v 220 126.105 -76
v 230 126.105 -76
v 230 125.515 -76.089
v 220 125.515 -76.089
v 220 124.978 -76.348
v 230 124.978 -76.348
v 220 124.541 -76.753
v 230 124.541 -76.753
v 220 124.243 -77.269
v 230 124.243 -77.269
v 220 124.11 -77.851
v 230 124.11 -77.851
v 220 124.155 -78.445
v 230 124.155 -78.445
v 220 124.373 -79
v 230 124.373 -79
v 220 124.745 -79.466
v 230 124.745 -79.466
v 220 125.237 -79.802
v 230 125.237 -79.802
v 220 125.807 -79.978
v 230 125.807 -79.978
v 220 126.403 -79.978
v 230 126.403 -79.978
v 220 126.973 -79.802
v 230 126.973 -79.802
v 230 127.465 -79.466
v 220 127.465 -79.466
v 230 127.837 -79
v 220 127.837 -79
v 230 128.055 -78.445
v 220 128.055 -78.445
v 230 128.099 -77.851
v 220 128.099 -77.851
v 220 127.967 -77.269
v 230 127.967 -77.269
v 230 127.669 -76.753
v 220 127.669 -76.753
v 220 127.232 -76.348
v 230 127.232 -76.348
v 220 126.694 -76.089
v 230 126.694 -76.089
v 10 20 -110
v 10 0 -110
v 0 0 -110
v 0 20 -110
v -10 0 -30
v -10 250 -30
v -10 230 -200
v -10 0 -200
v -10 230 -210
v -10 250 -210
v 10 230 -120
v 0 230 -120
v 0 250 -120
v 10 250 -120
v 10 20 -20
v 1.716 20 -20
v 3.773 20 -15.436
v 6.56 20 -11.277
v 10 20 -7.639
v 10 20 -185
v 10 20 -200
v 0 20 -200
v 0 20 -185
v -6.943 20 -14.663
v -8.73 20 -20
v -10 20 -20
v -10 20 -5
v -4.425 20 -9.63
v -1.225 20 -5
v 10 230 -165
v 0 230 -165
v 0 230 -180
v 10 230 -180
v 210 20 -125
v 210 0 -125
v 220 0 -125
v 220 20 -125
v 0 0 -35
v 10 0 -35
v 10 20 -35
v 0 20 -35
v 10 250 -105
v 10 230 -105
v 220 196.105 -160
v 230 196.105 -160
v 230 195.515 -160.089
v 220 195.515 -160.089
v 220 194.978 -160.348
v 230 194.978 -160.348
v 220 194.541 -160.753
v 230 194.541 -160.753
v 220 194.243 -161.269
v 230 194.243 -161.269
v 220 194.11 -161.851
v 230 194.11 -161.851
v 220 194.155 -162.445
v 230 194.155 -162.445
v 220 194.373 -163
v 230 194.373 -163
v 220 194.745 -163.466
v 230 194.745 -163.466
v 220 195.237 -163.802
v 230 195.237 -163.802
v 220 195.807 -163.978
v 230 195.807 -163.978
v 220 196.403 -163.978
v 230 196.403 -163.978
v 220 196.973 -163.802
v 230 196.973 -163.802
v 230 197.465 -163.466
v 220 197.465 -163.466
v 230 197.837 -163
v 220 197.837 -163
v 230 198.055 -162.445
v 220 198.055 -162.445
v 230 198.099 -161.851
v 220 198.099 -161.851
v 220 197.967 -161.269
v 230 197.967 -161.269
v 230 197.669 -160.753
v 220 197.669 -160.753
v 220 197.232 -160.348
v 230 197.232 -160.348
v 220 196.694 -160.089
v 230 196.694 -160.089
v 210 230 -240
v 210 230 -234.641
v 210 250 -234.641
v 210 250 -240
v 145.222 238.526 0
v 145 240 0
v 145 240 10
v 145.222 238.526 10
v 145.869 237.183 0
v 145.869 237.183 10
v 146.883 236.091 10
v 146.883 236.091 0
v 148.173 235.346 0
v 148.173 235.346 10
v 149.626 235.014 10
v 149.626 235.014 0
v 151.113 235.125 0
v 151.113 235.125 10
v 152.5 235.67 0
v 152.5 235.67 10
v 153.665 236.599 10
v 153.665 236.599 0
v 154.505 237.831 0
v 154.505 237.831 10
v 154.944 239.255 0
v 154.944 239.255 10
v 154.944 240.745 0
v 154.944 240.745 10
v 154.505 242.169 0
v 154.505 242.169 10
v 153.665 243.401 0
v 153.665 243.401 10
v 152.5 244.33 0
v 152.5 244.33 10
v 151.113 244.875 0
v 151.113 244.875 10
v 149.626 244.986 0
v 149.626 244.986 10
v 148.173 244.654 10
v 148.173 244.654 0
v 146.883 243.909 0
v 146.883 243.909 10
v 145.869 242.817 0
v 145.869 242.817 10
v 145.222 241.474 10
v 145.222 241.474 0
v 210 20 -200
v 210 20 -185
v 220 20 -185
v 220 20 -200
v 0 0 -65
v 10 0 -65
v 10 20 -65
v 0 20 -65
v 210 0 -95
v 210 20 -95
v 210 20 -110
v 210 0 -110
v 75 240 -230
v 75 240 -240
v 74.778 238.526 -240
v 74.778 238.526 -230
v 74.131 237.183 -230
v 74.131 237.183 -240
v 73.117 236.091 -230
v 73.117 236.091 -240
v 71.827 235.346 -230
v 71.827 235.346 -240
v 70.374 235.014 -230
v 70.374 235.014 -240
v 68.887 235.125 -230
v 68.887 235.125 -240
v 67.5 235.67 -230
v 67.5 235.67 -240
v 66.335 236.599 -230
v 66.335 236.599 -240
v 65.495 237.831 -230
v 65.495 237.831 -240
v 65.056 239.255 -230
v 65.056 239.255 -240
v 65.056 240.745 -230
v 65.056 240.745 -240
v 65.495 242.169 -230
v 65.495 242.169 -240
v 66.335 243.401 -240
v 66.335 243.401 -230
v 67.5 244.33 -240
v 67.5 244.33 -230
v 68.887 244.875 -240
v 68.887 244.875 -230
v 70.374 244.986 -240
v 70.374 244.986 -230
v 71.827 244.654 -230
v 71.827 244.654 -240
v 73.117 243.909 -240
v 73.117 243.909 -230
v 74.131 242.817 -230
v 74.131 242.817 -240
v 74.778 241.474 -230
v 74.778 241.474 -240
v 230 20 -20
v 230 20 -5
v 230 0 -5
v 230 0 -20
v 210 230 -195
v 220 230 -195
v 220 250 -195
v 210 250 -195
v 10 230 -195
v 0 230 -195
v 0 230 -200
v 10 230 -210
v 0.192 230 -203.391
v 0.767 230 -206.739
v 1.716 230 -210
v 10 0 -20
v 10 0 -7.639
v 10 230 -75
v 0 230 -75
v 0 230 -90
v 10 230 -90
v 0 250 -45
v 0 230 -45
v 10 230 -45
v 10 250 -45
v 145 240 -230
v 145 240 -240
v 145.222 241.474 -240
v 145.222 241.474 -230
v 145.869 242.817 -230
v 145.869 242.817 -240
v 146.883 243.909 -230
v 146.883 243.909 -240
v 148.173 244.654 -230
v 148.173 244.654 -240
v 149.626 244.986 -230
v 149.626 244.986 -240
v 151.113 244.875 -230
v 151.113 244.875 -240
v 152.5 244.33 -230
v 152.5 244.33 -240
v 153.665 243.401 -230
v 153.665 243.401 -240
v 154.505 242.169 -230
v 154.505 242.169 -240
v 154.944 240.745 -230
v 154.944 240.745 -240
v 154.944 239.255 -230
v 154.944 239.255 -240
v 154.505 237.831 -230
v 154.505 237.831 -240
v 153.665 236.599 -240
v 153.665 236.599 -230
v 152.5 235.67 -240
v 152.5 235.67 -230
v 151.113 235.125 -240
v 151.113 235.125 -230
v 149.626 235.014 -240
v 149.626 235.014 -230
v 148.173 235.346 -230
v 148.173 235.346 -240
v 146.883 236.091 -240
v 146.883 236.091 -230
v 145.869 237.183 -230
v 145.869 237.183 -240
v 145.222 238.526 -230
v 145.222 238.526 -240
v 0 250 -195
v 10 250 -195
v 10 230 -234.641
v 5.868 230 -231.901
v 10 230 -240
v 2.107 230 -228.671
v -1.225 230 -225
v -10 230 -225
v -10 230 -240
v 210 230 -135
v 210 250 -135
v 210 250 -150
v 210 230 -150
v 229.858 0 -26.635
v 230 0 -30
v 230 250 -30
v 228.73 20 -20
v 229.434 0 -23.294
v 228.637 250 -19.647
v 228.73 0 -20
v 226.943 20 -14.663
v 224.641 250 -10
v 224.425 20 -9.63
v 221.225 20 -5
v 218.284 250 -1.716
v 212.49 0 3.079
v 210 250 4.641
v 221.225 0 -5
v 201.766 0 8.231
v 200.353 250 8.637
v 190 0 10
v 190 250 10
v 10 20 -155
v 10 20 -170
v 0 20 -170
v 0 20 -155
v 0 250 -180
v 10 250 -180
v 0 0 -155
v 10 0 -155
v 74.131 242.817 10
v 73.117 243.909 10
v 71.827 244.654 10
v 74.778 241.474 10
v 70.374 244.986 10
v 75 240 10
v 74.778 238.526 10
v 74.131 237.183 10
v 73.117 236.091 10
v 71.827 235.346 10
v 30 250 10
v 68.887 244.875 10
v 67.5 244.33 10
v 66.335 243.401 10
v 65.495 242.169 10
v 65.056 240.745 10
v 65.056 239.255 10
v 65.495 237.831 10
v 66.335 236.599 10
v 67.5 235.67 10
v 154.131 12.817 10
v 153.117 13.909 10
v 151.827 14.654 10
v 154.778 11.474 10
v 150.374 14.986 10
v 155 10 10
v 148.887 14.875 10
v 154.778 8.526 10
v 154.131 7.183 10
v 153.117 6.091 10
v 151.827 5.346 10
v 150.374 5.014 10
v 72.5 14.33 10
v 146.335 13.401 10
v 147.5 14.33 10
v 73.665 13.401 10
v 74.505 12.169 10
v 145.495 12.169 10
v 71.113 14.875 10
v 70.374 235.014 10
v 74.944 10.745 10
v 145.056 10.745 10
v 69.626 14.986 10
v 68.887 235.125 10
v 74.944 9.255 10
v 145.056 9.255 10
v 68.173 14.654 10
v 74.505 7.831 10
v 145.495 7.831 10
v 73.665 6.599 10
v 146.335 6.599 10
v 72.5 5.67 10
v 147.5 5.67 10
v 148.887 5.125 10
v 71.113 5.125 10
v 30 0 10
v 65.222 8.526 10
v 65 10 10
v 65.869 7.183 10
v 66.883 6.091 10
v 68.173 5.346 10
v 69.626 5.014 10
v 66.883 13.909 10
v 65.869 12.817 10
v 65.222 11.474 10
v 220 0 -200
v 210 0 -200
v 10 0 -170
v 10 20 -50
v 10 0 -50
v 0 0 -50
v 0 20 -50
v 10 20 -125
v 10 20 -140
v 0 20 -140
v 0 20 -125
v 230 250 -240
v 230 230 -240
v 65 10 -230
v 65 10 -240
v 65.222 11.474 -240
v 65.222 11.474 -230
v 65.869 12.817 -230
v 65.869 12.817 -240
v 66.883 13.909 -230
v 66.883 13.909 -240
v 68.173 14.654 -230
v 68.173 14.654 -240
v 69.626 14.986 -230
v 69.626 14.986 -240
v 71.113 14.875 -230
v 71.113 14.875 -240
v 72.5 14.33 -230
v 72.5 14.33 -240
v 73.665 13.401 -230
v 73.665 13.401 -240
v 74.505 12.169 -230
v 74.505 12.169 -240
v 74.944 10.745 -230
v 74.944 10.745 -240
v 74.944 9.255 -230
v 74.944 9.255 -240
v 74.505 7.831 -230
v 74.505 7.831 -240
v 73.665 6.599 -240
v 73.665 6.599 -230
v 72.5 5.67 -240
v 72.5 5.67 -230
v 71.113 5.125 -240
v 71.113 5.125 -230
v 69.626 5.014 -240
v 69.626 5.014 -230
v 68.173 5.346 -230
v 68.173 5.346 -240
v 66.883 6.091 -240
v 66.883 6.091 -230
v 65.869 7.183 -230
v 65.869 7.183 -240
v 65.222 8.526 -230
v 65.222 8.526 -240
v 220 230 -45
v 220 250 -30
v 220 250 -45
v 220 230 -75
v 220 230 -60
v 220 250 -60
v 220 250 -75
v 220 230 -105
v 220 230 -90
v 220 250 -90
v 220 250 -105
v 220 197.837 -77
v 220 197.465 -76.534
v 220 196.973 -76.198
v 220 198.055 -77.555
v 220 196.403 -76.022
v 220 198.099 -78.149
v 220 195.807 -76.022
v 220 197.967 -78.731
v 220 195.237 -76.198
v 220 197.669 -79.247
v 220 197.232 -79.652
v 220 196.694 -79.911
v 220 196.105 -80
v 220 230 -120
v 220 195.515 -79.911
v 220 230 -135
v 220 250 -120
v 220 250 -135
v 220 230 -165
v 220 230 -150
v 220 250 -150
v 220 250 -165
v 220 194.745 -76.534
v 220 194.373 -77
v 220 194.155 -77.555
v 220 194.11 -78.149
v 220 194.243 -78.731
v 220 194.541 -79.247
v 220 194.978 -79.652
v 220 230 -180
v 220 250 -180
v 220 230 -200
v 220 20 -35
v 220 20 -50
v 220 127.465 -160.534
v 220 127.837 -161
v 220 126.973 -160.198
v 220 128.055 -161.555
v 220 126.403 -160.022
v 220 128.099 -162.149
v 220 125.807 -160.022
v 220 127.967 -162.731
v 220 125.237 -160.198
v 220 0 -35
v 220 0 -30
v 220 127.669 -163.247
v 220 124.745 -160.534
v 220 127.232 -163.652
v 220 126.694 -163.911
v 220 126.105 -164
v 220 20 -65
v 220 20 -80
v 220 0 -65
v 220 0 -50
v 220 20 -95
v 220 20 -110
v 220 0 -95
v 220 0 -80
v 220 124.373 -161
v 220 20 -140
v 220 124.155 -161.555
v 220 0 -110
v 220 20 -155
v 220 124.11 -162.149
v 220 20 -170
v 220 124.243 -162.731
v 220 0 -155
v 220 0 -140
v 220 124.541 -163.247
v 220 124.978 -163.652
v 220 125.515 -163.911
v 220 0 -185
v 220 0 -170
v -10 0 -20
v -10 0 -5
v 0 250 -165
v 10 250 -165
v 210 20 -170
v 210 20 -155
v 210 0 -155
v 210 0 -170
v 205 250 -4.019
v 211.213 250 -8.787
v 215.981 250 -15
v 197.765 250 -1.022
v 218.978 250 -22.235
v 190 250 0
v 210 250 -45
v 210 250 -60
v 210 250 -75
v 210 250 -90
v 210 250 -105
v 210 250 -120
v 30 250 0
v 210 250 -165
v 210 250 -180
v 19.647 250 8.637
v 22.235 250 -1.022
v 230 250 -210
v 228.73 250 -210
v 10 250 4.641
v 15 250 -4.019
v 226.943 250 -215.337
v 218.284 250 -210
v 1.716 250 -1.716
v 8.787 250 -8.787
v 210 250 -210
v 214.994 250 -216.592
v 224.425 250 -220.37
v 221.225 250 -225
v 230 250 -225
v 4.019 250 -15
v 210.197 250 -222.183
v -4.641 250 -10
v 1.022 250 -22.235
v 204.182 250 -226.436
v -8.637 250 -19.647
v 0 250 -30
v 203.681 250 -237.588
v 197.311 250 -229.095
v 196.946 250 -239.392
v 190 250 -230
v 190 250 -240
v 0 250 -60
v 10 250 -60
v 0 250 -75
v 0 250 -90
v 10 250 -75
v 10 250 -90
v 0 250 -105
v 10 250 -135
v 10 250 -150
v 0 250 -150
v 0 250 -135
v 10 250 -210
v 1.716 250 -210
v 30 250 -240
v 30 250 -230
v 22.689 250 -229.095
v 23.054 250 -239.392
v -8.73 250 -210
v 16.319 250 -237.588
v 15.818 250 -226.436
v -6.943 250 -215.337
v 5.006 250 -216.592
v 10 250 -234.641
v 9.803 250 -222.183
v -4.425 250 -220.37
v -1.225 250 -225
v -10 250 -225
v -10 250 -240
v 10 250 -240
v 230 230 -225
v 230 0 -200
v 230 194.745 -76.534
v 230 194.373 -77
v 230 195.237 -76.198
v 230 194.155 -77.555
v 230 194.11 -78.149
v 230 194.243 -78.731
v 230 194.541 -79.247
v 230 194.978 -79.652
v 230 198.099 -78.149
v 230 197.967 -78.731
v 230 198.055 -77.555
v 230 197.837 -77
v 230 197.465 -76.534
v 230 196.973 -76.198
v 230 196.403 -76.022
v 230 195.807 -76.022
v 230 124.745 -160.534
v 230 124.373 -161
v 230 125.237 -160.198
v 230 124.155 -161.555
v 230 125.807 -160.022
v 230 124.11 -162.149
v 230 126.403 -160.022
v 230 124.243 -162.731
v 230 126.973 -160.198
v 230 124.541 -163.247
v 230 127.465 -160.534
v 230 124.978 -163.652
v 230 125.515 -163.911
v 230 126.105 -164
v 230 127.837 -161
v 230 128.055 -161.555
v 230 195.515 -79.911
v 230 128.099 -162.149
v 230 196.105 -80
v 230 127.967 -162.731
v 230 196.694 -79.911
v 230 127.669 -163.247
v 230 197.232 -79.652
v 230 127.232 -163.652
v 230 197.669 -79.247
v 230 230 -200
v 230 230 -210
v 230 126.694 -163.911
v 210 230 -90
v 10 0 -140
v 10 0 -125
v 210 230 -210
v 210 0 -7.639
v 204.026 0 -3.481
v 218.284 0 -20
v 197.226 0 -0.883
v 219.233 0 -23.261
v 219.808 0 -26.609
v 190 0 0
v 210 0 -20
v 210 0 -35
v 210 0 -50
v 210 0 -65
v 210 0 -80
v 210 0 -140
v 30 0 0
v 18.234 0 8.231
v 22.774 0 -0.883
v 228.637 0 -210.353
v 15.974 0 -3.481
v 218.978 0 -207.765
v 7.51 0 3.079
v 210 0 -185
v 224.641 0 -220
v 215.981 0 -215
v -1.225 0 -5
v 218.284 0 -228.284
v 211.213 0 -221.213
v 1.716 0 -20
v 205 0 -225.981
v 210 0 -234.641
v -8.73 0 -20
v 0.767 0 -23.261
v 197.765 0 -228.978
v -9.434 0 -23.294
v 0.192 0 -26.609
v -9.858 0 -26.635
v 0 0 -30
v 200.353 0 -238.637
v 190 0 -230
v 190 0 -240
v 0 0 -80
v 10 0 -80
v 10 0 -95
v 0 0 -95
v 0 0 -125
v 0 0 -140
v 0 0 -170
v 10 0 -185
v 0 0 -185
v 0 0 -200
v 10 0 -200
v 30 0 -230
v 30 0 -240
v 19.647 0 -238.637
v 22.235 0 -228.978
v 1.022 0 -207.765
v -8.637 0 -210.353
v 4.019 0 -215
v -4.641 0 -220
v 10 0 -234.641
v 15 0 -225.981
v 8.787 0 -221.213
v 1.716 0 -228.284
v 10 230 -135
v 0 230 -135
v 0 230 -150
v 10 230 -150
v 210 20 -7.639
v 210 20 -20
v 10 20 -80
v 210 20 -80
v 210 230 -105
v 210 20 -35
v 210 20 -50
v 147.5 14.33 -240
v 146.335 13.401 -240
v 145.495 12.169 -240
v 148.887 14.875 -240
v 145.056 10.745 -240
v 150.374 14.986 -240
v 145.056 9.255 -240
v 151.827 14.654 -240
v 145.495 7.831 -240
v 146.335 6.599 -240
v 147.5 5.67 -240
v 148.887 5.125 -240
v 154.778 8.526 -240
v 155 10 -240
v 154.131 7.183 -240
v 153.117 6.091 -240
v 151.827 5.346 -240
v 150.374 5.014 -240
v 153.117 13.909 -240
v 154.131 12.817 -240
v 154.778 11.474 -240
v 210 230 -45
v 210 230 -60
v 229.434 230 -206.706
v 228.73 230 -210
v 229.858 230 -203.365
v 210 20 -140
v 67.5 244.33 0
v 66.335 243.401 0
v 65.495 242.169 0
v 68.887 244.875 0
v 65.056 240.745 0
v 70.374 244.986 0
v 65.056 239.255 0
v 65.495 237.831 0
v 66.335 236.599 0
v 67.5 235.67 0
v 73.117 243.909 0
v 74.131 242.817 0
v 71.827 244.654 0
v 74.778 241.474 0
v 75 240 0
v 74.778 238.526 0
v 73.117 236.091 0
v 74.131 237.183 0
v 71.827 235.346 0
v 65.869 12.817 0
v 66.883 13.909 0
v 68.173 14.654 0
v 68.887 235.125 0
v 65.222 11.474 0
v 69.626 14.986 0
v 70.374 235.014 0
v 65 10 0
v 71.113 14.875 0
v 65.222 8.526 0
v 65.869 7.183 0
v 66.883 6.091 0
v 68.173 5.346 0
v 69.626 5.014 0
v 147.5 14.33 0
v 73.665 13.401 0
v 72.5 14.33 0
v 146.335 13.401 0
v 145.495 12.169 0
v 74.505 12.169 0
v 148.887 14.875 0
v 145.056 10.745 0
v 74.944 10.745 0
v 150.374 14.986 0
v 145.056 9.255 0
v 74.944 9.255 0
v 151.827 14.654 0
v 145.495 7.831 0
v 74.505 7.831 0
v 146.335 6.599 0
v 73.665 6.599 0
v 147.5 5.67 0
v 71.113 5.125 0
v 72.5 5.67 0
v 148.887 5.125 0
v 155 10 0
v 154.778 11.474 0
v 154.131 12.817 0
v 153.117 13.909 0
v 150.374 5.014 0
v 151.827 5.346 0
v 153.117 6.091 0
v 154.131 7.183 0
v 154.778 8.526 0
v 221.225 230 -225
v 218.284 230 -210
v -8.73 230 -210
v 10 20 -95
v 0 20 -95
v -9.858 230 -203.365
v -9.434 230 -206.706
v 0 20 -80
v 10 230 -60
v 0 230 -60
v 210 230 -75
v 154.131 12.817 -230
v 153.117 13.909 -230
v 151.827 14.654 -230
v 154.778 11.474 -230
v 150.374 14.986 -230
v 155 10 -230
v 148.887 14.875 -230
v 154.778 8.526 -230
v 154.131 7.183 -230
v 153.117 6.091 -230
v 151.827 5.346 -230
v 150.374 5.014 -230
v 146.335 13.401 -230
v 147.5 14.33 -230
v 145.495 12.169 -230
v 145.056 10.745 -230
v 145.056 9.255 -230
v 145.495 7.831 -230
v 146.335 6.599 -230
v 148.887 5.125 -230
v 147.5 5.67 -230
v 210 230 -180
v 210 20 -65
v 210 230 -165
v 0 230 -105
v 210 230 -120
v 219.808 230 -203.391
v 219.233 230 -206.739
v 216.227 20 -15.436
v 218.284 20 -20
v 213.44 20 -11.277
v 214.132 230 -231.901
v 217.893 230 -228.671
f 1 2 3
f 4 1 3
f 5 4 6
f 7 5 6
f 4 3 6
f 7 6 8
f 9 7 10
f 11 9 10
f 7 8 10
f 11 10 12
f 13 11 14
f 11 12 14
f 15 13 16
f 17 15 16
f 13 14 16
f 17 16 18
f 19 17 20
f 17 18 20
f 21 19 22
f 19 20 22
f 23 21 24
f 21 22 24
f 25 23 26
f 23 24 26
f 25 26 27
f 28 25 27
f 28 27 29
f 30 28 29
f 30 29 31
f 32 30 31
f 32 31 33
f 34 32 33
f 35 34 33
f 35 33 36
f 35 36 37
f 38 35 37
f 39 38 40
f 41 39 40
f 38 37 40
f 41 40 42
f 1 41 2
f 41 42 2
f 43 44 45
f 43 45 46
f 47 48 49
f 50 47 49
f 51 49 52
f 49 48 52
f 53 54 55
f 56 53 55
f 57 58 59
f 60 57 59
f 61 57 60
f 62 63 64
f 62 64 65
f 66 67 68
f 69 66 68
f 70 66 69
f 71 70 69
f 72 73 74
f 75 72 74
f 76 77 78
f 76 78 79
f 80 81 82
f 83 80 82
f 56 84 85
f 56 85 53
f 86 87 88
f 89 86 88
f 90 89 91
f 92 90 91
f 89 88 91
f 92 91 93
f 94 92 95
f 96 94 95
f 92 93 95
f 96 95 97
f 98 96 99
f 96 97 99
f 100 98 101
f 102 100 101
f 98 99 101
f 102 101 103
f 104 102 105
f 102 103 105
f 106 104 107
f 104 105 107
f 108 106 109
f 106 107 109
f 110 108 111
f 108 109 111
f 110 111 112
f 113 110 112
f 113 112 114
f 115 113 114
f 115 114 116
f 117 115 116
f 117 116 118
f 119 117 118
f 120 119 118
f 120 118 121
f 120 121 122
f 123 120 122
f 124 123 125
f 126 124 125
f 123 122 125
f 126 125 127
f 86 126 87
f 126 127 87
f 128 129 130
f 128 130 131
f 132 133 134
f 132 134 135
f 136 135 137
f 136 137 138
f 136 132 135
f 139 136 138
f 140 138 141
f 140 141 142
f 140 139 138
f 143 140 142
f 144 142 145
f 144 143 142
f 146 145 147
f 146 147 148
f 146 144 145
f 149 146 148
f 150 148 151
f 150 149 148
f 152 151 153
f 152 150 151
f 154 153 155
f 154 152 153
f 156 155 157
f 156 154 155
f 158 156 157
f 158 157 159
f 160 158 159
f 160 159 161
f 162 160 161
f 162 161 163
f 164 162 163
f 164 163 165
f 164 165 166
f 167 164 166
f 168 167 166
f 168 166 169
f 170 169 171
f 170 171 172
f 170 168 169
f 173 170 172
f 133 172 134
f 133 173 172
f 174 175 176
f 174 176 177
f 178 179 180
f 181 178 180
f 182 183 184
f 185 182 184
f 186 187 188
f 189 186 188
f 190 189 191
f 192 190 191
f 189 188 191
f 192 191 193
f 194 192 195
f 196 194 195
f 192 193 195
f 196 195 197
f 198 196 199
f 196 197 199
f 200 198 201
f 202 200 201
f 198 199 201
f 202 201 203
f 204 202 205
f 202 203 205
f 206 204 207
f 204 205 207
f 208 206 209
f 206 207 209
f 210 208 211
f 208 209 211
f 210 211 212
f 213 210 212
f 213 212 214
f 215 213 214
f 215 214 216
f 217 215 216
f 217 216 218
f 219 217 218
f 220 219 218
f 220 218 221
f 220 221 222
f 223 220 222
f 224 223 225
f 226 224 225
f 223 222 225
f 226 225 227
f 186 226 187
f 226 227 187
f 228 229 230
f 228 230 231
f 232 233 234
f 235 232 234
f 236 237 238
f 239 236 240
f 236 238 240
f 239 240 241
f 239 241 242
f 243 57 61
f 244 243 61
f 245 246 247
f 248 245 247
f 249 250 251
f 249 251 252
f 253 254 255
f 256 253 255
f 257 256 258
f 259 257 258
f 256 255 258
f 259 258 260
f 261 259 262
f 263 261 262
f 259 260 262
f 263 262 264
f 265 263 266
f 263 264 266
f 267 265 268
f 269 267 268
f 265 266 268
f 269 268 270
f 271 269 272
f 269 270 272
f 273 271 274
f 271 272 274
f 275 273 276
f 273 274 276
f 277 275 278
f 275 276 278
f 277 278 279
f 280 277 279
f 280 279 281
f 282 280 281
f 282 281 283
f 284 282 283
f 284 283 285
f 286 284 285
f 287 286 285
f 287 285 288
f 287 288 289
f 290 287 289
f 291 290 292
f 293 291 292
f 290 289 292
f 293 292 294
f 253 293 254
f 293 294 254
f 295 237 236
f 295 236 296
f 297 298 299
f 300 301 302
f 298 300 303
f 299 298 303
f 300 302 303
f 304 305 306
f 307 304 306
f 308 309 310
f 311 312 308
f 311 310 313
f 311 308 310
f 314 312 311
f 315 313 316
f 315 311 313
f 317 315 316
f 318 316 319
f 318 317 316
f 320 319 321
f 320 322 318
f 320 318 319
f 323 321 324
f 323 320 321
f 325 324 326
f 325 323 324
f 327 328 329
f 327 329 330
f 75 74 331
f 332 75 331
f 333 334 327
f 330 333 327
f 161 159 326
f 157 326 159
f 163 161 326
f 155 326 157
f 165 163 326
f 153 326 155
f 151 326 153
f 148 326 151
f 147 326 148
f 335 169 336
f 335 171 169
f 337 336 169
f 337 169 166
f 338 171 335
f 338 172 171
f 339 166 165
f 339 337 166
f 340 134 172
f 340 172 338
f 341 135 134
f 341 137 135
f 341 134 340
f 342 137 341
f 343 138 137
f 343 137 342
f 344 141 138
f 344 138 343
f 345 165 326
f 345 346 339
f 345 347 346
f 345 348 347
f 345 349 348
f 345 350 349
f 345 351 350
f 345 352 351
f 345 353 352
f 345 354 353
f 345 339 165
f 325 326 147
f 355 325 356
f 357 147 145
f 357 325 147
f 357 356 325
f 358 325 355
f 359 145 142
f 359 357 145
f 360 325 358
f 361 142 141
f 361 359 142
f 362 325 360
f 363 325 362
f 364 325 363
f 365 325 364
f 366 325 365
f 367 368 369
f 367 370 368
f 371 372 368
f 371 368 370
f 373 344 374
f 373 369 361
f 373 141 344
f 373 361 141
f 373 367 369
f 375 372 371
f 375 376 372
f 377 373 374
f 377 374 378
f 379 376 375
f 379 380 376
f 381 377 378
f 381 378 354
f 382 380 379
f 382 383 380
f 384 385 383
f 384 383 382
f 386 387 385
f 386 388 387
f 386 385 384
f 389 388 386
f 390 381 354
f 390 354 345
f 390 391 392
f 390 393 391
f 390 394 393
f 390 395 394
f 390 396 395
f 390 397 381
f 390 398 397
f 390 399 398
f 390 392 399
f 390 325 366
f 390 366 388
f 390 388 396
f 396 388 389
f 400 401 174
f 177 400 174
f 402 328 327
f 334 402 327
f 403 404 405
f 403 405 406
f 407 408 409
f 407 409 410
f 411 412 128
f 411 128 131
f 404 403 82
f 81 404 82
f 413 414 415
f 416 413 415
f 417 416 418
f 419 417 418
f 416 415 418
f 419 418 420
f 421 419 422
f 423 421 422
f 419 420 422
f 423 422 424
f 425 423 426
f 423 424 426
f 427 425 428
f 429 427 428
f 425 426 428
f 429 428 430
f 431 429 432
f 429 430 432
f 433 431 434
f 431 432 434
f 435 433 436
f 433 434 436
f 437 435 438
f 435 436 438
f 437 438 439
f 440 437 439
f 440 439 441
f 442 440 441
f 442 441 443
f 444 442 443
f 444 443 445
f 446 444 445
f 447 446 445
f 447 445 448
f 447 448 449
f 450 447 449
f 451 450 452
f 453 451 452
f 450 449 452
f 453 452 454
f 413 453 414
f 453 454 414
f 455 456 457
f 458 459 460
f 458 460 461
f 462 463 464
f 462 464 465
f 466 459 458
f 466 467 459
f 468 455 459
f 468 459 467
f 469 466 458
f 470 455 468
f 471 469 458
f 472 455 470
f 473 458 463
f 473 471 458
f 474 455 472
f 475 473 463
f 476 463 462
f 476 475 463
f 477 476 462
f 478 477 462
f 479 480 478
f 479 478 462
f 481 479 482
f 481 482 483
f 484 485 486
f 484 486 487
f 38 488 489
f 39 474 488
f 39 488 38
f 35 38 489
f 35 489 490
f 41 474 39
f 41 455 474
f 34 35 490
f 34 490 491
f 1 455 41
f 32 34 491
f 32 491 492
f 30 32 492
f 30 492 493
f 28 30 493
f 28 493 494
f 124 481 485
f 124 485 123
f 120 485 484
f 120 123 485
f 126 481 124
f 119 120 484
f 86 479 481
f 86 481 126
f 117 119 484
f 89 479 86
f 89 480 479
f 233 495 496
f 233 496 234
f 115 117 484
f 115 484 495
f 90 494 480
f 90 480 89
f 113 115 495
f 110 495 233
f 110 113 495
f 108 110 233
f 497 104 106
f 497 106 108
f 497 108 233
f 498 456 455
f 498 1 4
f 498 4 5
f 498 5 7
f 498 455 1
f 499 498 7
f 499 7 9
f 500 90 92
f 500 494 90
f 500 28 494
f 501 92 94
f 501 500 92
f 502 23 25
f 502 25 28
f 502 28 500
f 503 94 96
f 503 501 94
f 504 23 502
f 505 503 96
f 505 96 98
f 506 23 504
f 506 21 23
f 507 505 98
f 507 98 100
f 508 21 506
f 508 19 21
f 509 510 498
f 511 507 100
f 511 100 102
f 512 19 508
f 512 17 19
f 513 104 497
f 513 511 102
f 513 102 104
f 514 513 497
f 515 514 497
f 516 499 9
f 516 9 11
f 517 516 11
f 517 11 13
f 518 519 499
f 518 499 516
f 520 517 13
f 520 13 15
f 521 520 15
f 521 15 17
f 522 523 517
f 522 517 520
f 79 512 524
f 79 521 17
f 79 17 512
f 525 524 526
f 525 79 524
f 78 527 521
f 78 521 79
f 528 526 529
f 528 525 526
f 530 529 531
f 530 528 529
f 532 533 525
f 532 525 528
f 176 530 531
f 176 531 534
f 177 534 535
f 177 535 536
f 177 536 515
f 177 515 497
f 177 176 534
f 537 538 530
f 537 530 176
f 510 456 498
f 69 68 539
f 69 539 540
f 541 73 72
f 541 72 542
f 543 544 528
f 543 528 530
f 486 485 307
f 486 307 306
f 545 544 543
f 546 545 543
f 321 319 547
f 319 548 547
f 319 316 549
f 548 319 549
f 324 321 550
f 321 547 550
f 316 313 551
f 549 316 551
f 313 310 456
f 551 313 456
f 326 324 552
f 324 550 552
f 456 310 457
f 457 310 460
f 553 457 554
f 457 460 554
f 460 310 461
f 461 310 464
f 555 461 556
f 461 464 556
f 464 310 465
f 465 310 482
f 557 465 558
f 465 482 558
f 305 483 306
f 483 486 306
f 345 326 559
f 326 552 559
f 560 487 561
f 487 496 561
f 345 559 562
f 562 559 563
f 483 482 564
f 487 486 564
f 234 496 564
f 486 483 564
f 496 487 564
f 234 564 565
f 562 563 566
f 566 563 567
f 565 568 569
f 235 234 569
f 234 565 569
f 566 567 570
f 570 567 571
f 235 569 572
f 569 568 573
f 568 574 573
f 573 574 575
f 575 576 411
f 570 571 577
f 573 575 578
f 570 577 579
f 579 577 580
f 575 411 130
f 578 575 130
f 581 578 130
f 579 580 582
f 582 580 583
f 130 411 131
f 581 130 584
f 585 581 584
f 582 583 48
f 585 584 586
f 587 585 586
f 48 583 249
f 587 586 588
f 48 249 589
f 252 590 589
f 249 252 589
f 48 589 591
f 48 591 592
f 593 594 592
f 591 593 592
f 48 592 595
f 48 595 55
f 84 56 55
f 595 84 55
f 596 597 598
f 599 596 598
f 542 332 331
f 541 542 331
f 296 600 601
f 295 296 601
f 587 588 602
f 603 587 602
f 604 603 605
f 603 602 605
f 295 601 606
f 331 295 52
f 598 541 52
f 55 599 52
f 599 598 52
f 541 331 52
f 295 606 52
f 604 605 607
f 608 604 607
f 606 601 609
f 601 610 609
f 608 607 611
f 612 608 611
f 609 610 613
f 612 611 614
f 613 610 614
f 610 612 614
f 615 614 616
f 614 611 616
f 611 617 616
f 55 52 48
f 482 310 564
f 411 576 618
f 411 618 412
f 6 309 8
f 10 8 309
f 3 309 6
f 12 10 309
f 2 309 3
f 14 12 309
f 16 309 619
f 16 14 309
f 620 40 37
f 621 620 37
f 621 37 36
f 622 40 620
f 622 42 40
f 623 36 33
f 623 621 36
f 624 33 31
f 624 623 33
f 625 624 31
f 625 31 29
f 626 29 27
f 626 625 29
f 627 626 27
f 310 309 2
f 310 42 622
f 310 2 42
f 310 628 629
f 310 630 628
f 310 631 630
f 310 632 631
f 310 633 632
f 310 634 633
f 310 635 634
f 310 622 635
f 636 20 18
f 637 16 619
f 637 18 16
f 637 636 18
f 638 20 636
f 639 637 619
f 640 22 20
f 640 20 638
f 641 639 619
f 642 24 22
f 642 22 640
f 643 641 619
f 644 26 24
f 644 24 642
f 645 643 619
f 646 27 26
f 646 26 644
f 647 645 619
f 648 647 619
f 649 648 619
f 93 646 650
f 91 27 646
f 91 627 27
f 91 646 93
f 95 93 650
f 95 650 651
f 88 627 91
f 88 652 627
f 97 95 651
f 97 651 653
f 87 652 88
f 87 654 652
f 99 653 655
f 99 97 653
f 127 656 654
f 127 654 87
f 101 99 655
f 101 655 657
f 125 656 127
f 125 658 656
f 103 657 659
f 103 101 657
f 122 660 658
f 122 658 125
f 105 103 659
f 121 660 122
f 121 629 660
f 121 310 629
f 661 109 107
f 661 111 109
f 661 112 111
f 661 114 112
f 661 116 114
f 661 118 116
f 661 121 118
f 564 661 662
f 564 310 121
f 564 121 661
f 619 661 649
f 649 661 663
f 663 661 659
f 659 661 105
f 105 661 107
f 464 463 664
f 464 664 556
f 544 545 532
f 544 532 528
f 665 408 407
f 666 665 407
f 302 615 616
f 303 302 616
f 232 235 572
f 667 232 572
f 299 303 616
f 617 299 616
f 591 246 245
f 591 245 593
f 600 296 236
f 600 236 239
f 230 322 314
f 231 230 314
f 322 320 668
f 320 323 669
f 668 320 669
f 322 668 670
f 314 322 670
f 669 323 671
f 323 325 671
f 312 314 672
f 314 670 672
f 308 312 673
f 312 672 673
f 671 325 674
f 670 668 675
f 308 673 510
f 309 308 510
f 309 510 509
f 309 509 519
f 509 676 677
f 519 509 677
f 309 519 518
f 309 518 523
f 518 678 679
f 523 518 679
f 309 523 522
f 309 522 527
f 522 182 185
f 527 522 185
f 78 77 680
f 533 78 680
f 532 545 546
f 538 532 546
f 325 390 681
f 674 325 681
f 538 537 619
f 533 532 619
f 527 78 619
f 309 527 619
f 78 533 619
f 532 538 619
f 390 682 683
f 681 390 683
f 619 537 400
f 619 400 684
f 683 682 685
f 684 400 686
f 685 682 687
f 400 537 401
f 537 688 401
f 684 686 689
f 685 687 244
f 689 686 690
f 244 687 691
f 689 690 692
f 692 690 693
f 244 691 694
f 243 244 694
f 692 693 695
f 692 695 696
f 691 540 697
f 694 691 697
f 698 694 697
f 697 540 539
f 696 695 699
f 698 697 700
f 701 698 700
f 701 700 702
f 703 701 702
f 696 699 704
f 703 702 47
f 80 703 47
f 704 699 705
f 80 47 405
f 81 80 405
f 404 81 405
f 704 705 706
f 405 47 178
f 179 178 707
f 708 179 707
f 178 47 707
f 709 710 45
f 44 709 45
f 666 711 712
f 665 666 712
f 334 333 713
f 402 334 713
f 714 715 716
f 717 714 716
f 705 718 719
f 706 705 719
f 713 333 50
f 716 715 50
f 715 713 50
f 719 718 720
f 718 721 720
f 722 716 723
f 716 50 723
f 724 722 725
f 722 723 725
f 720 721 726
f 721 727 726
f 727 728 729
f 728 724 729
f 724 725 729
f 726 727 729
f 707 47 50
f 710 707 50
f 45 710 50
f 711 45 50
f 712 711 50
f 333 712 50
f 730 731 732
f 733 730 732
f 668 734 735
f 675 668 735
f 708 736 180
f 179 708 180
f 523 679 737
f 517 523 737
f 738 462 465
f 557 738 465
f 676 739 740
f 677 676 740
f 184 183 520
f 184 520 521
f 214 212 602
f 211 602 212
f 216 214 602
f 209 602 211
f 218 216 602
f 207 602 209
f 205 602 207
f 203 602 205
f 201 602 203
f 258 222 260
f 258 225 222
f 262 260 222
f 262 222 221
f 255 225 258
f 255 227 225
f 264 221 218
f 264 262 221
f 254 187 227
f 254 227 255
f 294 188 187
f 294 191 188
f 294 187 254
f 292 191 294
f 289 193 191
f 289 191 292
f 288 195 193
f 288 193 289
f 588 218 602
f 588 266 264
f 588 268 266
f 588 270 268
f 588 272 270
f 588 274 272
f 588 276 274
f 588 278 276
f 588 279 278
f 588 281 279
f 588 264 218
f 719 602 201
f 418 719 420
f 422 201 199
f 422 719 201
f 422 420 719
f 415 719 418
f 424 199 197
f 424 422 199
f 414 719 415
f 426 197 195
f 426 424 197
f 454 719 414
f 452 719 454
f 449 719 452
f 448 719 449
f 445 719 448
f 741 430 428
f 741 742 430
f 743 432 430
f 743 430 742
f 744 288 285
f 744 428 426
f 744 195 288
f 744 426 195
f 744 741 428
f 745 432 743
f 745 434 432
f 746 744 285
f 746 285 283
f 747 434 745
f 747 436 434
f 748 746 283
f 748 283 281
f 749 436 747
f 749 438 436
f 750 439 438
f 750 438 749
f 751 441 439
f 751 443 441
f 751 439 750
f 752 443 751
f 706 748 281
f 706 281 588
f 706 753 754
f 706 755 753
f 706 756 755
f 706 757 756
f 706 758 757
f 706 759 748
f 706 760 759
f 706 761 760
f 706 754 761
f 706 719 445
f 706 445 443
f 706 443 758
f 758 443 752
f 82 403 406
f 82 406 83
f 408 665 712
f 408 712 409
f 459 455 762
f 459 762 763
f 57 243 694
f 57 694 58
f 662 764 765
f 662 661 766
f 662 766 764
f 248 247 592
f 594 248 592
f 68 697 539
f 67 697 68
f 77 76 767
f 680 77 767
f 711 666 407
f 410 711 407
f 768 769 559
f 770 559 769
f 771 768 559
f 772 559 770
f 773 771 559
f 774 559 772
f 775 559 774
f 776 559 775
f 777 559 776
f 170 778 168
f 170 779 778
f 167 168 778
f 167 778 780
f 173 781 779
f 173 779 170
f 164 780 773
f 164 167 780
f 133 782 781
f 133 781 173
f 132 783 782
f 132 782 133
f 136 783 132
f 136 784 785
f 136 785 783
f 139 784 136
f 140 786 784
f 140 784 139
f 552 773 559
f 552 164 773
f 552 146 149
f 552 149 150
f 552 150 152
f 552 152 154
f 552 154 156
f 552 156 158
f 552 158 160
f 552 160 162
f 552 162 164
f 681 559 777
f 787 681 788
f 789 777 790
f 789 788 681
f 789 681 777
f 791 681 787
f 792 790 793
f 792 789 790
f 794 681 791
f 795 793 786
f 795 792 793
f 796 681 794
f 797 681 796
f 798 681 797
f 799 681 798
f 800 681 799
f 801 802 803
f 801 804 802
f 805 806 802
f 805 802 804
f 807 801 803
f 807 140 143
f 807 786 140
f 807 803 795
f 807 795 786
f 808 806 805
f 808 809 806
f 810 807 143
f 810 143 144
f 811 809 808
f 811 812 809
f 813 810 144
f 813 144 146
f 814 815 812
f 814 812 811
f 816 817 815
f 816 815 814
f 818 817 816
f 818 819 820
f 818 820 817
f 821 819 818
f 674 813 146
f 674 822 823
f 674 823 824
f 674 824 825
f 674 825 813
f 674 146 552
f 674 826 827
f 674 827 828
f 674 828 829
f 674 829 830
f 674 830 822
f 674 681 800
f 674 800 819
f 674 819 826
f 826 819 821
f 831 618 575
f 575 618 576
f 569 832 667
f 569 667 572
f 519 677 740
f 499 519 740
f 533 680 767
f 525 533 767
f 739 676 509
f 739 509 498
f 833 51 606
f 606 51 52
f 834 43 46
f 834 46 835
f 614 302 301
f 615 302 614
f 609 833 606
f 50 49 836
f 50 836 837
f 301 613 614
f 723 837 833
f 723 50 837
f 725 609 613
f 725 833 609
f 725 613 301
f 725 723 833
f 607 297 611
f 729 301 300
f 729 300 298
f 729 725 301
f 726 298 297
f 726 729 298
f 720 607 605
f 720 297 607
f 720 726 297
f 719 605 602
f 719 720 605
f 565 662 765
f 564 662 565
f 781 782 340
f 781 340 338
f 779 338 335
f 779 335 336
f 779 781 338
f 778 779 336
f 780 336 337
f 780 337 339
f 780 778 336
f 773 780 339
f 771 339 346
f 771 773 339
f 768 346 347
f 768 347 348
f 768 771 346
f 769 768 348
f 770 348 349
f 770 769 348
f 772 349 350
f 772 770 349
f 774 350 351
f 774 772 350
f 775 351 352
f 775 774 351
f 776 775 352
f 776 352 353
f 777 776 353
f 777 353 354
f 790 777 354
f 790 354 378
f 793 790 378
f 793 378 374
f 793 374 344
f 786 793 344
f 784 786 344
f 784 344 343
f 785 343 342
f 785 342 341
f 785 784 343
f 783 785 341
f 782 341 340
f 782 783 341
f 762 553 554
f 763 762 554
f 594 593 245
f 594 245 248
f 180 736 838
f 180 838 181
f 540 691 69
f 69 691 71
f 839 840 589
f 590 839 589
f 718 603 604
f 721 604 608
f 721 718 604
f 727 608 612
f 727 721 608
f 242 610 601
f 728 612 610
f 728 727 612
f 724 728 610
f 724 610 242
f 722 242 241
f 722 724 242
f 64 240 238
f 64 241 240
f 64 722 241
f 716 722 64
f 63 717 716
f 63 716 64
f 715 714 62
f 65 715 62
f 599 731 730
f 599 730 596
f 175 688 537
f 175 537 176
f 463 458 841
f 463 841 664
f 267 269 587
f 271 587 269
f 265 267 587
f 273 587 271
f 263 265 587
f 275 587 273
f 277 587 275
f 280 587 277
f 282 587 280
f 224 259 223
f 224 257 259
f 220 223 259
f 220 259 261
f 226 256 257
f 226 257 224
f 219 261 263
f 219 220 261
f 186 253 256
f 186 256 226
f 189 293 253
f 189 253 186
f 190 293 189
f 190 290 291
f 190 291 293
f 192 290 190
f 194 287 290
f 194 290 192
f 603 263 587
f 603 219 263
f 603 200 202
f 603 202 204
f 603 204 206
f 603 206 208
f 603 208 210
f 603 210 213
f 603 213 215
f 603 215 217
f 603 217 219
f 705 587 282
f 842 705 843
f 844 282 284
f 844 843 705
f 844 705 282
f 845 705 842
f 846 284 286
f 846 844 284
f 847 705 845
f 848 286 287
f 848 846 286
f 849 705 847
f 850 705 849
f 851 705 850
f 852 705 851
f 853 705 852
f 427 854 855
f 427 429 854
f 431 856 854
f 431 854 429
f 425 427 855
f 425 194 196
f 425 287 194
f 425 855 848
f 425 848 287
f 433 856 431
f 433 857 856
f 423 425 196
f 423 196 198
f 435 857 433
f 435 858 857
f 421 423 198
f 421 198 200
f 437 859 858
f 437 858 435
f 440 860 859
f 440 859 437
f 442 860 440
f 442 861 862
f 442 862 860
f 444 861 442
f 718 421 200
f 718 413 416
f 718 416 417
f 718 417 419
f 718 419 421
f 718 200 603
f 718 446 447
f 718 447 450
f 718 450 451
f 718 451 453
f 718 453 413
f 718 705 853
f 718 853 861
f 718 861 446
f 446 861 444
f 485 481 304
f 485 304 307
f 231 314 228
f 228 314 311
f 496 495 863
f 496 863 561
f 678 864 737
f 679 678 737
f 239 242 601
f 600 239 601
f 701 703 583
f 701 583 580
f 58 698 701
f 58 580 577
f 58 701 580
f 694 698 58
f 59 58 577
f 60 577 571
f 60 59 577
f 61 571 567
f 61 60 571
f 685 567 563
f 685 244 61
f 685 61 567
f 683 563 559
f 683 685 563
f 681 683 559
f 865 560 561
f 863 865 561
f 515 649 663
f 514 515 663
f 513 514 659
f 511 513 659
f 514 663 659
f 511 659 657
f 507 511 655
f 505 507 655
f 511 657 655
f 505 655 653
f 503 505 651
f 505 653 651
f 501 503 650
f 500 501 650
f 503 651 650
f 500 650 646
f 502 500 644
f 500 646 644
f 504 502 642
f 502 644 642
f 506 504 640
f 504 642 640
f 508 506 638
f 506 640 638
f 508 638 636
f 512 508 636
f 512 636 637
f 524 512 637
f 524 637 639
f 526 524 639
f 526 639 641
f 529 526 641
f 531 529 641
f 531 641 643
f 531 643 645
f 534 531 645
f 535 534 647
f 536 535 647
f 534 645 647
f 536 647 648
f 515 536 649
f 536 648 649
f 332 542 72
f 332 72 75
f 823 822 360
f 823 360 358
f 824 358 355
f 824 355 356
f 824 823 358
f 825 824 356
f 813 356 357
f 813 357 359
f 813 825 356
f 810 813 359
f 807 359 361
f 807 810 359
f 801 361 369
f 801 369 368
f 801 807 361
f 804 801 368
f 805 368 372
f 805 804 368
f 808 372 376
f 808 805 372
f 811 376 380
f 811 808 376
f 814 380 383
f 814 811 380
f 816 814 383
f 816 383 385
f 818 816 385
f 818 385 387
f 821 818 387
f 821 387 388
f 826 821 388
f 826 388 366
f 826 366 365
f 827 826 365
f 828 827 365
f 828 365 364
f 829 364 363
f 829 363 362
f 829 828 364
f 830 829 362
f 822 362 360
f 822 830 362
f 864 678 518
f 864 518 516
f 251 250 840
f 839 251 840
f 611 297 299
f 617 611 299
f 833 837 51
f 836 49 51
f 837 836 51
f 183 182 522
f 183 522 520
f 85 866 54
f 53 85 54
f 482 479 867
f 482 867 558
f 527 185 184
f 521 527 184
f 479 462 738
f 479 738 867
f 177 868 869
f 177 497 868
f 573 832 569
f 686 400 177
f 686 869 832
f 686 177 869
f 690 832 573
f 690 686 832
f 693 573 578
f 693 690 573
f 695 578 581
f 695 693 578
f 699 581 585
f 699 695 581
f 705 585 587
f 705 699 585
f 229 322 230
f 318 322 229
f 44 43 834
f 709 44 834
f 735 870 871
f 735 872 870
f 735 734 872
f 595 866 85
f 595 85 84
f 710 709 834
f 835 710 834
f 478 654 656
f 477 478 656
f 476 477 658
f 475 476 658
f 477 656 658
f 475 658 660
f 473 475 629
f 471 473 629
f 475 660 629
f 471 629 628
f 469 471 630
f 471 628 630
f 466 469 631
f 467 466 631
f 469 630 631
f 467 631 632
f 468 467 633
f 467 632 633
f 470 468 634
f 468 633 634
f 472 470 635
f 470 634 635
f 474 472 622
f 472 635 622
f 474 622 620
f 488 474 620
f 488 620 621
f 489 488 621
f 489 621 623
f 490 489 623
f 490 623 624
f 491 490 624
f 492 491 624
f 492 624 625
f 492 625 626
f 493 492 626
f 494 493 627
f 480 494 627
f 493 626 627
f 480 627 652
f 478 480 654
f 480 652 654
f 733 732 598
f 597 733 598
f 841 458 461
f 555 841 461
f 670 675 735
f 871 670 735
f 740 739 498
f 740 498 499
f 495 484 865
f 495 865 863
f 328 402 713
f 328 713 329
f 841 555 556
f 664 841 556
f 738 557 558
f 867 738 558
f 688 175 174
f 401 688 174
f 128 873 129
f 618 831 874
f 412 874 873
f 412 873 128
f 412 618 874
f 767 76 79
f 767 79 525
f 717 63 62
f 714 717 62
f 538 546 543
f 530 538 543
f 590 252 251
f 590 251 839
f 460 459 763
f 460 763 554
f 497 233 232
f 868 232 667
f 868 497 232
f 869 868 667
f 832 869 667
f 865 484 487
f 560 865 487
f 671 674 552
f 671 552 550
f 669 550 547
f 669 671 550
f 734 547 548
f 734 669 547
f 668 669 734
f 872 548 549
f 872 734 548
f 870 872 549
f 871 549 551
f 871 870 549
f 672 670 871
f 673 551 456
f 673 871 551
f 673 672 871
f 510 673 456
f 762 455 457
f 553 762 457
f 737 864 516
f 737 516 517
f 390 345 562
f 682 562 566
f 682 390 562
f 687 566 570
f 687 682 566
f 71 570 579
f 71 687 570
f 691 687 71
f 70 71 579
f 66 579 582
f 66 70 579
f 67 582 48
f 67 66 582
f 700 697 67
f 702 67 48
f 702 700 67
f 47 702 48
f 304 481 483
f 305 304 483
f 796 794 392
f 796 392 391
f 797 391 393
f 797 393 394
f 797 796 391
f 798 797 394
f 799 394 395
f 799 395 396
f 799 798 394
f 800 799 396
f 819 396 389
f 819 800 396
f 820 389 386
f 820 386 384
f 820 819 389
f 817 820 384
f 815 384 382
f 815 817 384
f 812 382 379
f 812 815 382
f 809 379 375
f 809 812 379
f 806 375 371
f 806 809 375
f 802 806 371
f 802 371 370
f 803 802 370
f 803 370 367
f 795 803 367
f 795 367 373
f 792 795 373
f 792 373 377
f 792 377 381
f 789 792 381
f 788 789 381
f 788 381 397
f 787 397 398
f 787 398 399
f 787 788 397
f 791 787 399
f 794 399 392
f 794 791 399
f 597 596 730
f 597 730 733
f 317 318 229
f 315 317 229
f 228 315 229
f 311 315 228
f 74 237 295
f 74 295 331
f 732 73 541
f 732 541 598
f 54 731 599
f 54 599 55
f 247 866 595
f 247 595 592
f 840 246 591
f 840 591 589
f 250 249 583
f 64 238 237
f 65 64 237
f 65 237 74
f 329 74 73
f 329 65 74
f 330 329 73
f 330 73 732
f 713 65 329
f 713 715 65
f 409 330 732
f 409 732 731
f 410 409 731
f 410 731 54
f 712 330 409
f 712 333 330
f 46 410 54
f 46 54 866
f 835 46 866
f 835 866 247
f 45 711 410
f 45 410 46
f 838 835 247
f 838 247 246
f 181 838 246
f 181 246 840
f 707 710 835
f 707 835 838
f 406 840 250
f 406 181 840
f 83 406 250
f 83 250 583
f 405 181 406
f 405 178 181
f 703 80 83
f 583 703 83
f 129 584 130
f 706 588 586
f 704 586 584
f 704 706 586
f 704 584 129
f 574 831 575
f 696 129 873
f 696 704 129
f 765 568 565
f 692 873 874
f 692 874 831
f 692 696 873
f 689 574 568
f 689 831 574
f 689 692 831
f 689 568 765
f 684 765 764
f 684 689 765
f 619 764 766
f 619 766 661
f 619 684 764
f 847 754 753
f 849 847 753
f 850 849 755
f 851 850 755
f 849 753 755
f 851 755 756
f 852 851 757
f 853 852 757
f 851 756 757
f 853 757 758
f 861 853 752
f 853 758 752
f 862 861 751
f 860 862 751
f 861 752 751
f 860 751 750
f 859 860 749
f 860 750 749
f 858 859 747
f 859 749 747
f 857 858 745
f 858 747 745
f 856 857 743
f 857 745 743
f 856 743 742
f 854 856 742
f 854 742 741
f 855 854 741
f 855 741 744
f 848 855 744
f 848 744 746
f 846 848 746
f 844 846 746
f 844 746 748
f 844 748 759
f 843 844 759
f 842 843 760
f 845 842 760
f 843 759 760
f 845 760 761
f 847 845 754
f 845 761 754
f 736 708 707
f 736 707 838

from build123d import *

# Parameters (mm, degrees)
BOSS_EXTRUDE1_DEPTH = 250
SKETCH3_W           = 15
SKETCH3_H           = 20
BOSS_EXTRUDE2_DEPTH = 20
SKETCH4_W           = 15
SKETCH4_H           = 20
BOSS_EXTRUDE3_DEPTH = 20
SKETCH8_W           = 15
SKETCH8_H           = 20
BOSS_EXTRUDE5_DEPTH = 20
SKETCH9_W           = 15
SKETCH9_H           = 20
BOSS_EXTRUDE6_DEPTH = 20
SKETCH11_R          = 2
CUT_EXTRUDE1_DEPTH  = 10
SKETCH12_R          = 5
CUT_EXTRUDE2_DEPTH  = 10
CUT_EXTRUDE3_START  = -10
SKETCH13_R          = 5
CUT_EXTRUDE3_DEPTH  = 10


with BuildPart() as part:
    # Sketch1 → Boss-Extrude1 (new body)
    with BuildSketch(Plane(origin=(0, 0, 0), x_dir=(1, 0, 0), z_dir=(0, 1, 0))):
        with BuildLine():
            Line((-10, 30), (-10, 200))
            ThreePointArc((-10, 200), (1.715728753, 228.284271247), (30, 240))
            Line((30, 240), (190, 240))
            ThreePointArc((190, 240), (218.284271247, 228.284271247), (230, 200))
            Line((230, 200), (230, 30))
            ThreePointArc((230, 30), (218.284271247, 1.715728753), (190, -10))
            Line((190, -10), (30, -10))
            ThreePointArc((30, -10), (1.715728753, 1.715728753), (-10, 30))
        make_face()
        with BuildLine():
            Line((30, 0), (190, 0))
            ThreePointArc((190, 0), (211.213203436, 8.786796564), (220, 30))
            Line((220, 30), (220, 200))
            ThreePointArc((220, 200), (211.213203436, 221.213203436), (190, 230))
            Line((190, 230), (30, 230))
            ThreePointArc((30, 230), (8.786796564, 221.213203436), (0, 200))
            Line((0, 200), (0, 30))
            ThreePointArc((0, 30), (8.786796564, 8.786796564), (30, 0))
        make_face(mode=Mode.SUBTRACT)
    extrude(amount=BOSS_EXTRUDE1_DEPTH)

    # Sketch3 → Boss-Extrude2 (add)
    with BuildSketch(Plane.ZY.offset(10)):
        with Locations((-192.5, 10)):
            Rectangle(SKETCH3_W, SKETCH3_H)
        with Locations((-162.5, 10)):
            Rectangle(SKETCH3_W, SKETCH3_H)
        with Locations((-132.5, 10)):
            Rectangle(SKETCH3_W, SKETCH3_H)
        with Locations((-102.5, 10)):
            Rectangle(SKETCH3_W, SKETCH3_H)
        with Locations((-72.5, 10)):
            Rectangle(SKETCH3_W, SKETCH3_H)
        with Locations((-42.5, 10)):
            Rectangle(SKETCH3_W, SKETCH3_H)
        with Locations((-12.5, 10)):
            Rectangle(SKETCH3_W, SKETCH3_H)
    extrude(amount=-BOSS_EXTRUDE2_DEPTH)

    # Sketch4 → Boss-Extrude3 (add)
    with BuildSketch(Plane(origin=(230, 0, 0), x_dir=(0, 0, -1), z_dir=(1, 0, 0))):
        with Locations((192.5, 10)):
            Rectangle(SKETCH4_W, SKETCH4_H)
        with Locations((162.5, 10)):
            Rectangle(SKETCH4_W, SKETCH4_H)
        with Locations((132.5, 10)):
            Rectangle(SKETCH4_W, SKETCH4_H)
        with Locations((102.5, 10)):
            Rectangle(SKETCH4_W, SKETCH4_H)
        with Locations((72.5, 10)):
            Rectangle(SKETCH4_W, SKETCH4_H)
        with Locations((42.5, 10)):
            Rectangle(SKETCH4_W, SKETCH4_H)
        with Locations((12.5, 10)):
            Rectangle(SKETCH4_W, SKETCH4_H)
    extrude(amount=-BOSS_EXTRUDE3_DEPTH)

    # Sketch8 → Boss-Extrude5 (add)
    with BuildSketch(Plane(origin=(-10, 0, 0), x_dir=(0, 0, -1), z_dir=(1, 0, 0))):
        with Locations((52.5, 240)):
            Rectangle(SKETCH8_W, SKETCH8_H)
        with Locations((82.5, 240)):
            Rectangle(SKETCH8_W, SKETCH8_H)
        with Locations((112.5, 240)):
            Rectangle(SKETCH8_W, SKETCH8_H)
        with Locations((142.5, 240)):
            Rectangle(SKETCH8_W, SKETCH8_H)
        with Locations((172.5, 240)):
            Rectangle(SKETCH8_W, SKETCH8_H)
        with Locations((202.5, 240)):
            Rectangle(SKETCH8_W, SKETCH8_H)
        with Locations((232.5, 240)):
            Rectangle(SKETCH8_W, SKETCH8_H)
    extrude(amount=BOSS_EXTRUDE5_DEPTH)

    # Sketch9 → Boss-Extrude6 (add)
    with BuildSketch(Plane(origin=(230, 0, 0), x_dir=(0, 0, -1), z_dir=(1, 0, 0))):
        with Locations((52.5, 240)):
            Rectangle(SKETCH9_W, SKETCH9_H)
        with Locations((82.5, 240)):
            Rectangle(SKETCH9_W, SKETCH9_H)
        with Locations((112.5, 240)):
            Rectangle(SKETCH9_W, SKETCH9_H)
        with Locations((142.5, 240)):
            Rectangle(SKETCH9_W, SKETCH9_H)
        with Locations((172.5, 240)):
            Rectangle(SKETCH9_W, SKETCH9_H)
        with Locations((202.5, 240)):
            Rectangle(SKETCH9_W, SKETCH9_H)
        with Locations((232.5, 240)):
            Rectangle(SKETCH9_W, SKETCH9_H)
    extrude(amount=-BOSS_EXTRUDE6_DEPTH)

    # Sketch11 → Cut-Extrude1 (cut)
    with BuildSketch(Plane(origin=(230, 0, 0), x_dir=(0, 0, -1), z_dir=(1, 0, 0))):
        with Locations((78, 196.104898216)):
            Circle(SKETCH11_R)
        with Locations((78, 126.104898216)):
            Circle(SKETCH11_R)
        with Locations((162, 126.104898216)):
            Circle(SKETCH11_R)
        with Locations((162, 196.104898216)):
            Circle(SKETCH11_R)
    extrude(amount=-CUT_EXTRUDE1_DEPTH, mode=Mode.SUBTRACT)

    # Sketch12 → Cut-Extrude2 (cut)
    with BuildSketch(Plane(origin=(0, 0, -240), x_dir=(-1, 0, 0), z_dir=(0, 0, -1))):
        with Locations((-150, 240)):
            Circle(SKETCH12_R)
        with Locations((-70, 240)):
            Circle(SKETCH12_R)
        with Locations((-70, 10)):
            Circle(SKETCH12_R)
        with Locations((-150, 10)):
            Circle(SKETCH12_R)
    extrude(amount=-CUT_EXTRUDE2_DEPTH, mode=Mode.SUBTRACT)

    # Sketch13 → Cut-Extrude3 (cut)
    with BuildSketch(Plane.XY.offset(10).offset(CUT_EXTRUDE3_START)):
        with Locations((70, 240)):
            Circle(SKETCH13_R)
        with Locations((150, 240)):
            Circle(SKETCH13_R)
        with Locations((150, 10)):
            Circle(SKETCH13_R)
        with Locations((70, 10)):
            Circle(SKETCH13_R)
    extrude(amount=CUT_EXTRUDE3_DEPTH, mode=Mode.SUBTRACT)


solid = part.part
